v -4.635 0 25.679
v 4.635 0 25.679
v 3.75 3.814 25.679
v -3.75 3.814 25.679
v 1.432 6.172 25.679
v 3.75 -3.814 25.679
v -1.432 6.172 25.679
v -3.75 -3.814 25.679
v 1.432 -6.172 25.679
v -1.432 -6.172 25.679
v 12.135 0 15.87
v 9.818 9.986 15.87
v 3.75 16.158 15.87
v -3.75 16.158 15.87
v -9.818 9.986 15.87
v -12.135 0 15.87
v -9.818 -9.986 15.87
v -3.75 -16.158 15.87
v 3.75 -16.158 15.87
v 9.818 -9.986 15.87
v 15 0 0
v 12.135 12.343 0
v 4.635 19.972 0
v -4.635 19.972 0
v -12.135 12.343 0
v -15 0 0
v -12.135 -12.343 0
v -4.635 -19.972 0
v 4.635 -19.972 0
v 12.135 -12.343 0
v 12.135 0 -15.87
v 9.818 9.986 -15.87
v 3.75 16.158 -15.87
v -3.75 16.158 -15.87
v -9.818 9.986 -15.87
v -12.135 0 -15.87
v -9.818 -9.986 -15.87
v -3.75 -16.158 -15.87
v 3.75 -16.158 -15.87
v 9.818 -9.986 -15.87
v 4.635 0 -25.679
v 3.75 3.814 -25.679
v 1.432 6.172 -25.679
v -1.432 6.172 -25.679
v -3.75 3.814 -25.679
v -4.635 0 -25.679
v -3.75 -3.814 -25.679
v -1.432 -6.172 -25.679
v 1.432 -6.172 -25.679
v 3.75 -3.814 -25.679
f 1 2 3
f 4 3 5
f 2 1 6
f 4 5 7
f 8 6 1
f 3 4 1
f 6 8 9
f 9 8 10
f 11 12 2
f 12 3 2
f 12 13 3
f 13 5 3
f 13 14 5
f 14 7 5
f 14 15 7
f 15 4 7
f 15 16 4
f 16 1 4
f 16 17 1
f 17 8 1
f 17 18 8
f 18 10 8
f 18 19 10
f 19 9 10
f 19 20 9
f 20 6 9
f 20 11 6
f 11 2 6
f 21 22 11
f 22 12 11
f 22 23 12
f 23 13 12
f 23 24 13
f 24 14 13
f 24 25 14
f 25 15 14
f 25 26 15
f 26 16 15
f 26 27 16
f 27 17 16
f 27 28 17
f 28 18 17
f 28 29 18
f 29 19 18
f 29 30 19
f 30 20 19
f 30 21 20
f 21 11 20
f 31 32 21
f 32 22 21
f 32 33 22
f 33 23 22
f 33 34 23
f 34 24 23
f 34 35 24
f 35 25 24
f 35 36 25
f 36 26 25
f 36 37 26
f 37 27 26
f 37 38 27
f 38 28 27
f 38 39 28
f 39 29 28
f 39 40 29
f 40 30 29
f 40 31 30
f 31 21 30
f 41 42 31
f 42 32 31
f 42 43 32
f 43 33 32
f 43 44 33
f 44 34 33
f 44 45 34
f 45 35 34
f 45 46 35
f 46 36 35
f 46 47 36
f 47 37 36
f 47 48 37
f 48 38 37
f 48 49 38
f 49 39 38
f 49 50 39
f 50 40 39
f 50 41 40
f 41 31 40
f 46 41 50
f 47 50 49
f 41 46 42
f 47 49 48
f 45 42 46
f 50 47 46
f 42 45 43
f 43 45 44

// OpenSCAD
// Generated by SolidPython 1.0.1 on 2020-07-29 00:46:46


scale(v = [5, 7, 9]) {
	sphere(r = 3);
}
/***********************************************
*********      SolidPython code:      **********
************************************************
 
# import packages: SolidPython
from solid import *
from solid.utils import *
from itertools import chain, combinations, permutations


class Resize:

    def __init__(self, scad_file):
        self.scad_file = scad_file
        #self.scad_file = import_scad(scad_file)
        # cone/cylinder param:
        self.r1 = 0
        self.r2 = 0
        self.h = 0
        # rectangular prism param:
        self.w = 0
        self.l = 0
        # ellipse param:
        self.r = 0

    # import OpenScad code (file name corresponds to shape)


    # classify shape + parameters
    def assign(self, param1, param2, param3):
        if self.scad_file == 'cone.scad':
            self.r1 = param1
            self.r2 = param2
            self.h = param3
        elif self.scad_file == 'cylinder.scad':
            self.r1 = param1
            self.r2 = param2
            self.h = param3
        elif self.scad_file == 'rectangularPrism.scad':
            self.h = param1
            self.l = param2
            self.w = param3
        else:
            self.r = param1
            self.h = param2

    # resize parameters
    def iterate(self):
        x = range(3, 20, 2)
        i = 1
        if self.scad_file == 'cone.scad':
            tempList = list(permutations(x, 2))
            for temp in tempList:
                param1 = temp[0]
                param2 = temp[1]
                filepath = 'produced_scad_files/' + 'cone' + str(param1) + '_' + str(param2) + '_' + '.scad'
                scad_render_to_file(cylinder(h=param1, r1=param2, r2=0), filepath)

        elif self.scad_file == 'cylinder.scad':
            tempList = list(permutations(x, 3))
            for temp in tempList:
                param1 = temp[0]
                param2 = temp[1]
                filepath = 'produced_scad_files/' + 'cylinder' + str(param1) + '_' + str(param2) + '_' + '.scad'
                scad_render_to_file(cylinder(h=param1, r1=param2, r2=param2), filepath)

        elif self.scad_file == 'rectangularPrism.scad':
            tempList = list(permutations(x, 3))
            for temp in tempList:
                param1 = temp[0]
                param2 = temp[1]
                param3 = temp[2]
                filepath = 'produced_scad_files/' + 'rectangularPrism' + str(param1) + '_' + str(param2) + '_' + str(
                    param3) + '.scad'
                scad_render_to_file(cube(size=(param1, param2, param3)), filepath)

        elif self.scad_file == 'ellipse.scad':
            tempList = list(permutations(x, 4))
            for temp in tempList:
                param1 = temp[0]
                param2 = temp[1]
                param3 = temp[2]
                param4 = temp[3]
                filepath = 'produced_scad_files/' + 'ellipse' + str(param1) + '_' + str(param2) + '_' + str(param3) + '_' + str(param4) + '.scad'
                scad_render_to_file(scale([param1, param2, param3])(sphere(r=param4)), filepath)

    def render_to_scadfile(self):
        scad_render_to_file(scad, 'example.scad') 
 
************************************************/
